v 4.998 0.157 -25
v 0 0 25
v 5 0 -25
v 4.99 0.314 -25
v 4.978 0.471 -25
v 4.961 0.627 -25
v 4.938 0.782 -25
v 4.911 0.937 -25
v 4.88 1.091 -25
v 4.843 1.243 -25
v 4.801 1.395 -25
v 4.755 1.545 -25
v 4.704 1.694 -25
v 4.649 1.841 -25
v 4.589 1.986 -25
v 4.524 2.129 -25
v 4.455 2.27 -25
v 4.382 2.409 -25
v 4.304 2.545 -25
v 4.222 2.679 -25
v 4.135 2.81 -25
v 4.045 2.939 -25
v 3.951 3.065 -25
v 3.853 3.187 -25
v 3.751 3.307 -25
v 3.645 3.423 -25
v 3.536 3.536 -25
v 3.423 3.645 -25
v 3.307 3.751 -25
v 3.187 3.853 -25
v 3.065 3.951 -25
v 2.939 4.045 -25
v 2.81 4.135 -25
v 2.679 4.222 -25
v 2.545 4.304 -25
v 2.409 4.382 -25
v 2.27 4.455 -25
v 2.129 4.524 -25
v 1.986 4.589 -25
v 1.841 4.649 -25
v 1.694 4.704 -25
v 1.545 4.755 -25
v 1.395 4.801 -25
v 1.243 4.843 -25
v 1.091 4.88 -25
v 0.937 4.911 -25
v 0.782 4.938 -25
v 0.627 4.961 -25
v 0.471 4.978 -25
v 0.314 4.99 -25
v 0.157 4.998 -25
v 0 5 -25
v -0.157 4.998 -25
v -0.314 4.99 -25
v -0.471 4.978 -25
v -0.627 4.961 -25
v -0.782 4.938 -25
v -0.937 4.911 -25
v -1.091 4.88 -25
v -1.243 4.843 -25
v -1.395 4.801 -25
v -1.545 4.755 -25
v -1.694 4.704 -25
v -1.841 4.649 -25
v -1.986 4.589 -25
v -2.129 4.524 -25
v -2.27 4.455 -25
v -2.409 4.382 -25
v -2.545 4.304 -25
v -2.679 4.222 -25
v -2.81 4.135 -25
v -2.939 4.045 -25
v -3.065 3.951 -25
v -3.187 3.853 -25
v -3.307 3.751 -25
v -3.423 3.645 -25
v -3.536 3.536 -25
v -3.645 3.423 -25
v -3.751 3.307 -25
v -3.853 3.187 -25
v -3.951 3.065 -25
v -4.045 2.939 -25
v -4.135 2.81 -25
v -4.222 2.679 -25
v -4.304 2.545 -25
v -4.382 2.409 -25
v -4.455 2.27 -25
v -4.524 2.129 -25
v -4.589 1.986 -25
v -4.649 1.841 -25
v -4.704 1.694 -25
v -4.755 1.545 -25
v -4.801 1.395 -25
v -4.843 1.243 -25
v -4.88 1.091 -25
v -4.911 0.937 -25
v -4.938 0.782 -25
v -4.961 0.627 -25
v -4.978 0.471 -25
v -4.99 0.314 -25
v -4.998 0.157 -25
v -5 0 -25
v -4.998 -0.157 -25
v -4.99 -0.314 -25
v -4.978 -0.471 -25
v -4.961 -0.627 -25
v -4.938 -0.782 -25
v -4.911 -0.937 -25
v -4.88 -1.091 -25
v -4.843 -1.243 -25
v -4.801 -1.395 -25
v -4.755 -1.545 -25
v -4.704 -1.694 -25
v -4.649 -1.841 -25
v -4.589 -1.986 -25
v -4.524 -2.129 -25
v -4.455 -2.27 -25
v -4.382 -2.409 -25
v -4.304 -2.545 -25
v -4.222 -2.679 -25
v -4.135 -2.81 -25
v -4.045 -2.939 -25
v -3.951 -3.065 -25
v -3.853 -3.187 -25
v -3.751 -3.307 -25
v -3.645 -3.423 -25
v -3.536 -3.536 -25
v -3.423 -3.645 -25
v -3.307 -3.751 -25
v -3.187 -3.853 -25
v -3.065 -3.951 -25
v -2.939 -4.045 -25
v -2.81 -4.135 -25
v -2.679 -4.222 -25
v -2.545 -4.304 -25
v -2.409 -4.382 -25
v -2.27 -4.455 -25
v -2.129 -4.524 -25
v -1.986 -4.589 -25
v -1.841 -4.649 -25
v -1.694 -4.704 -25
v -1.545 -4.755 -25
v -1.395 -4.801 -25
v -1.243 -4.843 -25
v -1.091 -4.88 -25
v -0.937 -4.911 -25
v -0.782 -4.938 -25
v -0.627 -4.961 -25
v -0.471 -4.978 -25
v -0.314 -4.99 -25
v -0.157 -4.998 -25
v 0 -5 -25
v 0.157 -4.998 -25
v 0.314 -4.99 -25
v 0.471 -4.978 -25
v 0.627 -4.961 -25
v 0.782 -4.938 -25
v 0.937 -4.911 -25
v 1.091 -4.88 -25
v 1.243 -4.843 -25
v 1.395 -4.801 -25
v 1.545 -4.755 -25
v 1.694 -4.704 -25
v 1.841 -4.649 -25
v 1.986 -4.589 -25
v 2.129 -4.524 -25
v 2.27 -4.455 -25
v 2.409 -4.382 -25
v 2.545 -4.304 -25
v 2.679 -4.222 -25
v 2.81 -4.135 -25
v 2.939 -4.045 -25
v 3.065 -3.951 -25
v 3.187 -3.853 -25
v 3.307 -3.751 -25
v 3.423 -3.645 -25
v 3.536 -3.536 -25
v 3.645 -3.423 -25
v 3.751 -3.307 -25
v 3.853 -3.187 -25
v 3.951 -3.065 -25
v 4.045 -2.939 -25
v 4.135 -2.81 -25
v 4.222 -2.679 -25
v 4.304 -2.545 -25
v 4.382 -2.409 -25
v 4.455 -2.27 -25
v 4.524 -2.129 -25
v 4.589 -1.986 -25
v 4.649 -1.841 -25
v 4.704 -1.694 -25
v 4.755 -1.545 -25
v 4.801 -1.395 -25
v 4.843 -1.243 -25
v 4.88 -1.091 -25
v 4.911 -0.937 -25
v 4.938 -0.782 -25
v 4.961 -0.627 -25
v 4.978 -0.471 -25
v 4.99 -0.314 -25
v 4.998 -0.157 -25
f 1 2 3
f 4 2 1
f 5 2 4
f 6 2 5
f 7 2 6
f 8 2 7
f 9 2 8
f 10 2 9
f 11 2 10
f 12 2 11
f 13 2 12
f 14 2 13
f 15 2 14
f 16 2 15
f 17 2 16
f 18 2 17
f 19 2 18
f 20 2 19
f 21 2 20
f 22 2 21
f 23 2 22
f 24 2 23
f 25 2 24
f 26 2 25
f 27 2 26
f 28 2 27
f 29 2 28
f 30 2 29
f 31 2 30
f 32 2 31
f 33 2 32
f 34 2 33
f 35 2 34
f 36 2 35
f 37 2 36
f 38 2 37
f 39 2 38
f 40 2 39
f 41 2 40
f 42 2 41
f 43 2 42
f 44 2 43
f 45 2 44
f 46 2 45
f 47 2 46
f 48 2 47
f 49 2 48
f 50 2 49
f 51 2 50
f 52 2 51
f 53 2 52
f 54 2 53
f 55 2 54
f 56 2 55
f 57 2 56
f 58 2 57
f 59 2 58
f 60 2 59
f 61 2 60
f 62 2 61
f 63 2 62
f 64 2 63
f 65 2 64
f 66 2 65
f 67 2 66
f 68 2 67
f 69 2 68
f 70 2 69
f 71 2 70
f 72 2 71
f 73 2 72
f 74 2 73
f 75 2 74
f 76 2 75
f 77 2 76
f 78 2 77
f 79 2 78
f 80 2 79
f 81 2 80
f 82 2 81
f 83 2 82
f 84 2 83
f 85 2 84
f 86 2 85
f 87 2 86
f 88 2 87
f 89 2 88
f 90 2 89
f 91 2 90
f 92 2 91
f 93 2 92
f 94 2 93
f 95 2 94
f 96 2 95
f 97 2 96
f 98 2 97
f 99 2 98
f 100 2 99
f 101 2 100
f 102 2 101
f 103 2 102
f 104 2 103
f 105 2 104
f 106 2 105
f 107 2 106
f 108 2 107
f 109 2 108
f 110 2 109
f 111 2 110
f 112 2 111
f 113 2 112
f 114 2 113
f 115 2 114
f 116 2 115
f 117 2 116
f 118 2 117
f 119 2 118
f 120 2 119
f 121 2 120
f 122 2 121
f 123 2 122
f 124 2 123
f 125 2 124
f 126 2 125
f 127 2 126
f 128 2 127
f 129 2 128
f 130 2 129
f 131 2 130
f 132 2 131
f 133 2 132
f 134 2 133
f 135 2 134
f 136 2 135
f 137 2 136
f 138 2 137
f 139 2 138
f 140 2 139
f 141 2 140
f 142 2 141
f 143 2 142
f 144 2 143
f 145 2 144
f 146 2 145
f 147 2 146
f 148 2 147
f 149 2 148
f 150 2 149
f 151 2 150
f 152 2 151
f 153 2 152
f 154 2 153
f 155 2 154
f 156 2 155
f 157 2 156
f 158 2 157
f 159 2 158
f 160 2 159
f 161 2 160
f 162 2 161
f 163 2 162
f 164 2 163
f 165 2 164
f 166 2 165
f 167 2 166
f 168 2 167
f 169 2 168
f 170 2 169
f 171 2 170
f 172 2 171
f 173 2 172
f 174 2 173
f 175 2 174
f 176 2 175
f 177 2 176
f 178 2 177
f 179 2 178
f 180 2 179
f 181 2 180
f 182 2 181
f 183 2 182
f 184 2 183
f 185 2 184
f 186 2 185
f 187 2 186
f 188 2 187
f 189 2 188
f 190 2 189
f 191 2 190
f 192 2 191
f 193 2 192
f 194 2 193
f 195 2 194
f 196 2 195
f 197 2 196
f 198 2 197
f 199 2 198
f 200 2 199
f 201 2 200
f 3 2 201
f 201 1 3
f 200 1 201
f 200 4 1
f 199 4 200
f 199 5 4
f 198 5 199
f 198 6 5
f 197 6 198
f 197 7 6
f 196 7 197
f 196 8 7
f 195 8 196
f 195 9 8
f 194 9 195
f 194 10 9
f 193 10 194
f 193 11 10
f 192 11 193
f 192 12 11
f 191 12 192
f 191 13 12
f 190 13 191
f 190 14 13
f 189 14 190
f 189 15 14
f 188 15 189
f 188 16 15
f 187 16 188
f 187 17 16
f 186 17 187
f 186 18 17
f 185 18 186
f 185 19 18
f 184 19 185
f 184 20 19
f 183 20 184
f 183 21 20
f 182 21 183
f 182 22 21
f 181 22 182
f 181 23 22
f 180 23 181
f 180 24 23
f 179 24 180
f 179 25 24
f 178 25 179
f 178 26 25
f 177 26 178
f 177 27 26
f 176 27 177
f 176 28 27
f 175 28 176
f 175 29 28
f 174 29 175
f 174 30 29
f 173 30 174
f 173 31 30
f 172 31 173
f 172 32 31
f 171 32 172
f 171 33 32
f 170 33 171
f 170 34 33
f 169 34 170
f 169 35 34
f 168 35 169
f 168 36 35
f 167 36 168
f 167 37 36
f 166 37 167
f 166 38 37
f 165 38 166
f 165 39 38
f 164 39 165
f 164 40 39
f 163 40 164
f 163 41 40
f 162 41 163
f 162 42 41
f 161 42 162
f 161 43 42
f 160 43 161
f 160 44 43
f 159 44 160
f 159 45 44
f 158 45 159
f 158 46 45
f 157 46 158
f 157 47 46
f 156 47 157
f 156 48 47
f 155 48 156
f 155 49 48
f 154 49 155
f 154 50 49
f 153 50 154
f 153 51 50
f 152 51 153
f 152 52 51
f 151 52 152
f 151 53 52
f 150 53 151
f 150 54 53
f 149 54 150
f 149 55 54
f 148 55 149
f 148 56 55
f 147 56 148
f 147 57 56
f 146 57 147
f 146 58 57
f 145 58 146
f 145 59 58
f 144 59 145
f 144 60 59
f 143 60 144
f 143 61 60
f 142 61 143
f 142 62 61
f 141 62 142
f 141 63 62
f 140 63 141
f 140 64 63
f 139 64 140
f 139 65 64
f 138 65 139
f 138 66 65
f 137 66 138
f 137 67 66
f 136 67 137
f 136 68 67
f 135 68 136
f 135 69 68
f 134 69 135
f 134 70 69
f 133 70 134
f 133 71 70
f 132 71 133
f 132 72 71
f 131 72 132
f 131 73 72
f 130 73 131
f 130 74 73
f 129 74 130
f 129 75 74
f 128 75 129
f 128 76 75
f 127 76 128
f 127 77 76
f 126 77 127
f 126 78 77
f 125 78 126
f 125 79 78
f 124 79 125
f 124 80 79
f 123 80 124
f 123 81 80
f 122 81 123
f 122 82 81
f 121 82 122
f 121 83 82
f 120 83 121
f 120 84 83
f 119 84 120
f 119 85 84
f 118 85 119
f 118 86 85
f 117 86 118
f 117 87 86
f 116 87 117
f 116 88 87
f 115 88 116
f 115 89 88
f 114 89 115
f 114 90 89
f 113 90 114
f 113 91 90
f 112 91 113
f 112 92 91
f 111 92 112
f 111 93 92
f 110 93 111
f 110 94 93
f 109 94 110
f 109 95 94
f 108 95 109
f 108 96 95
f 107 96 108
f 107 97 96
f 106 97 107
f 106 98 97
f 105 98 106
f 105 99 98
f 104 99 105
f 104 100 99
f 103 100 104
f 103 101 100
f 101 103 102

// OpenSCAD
/*this is a multi line
comment!*/

//cylinder(r = 10, h = 50, center = true, $fn=200);

cylinder(d1 = 10,d2 = 0, h = 50, center = true, $fn=200);
